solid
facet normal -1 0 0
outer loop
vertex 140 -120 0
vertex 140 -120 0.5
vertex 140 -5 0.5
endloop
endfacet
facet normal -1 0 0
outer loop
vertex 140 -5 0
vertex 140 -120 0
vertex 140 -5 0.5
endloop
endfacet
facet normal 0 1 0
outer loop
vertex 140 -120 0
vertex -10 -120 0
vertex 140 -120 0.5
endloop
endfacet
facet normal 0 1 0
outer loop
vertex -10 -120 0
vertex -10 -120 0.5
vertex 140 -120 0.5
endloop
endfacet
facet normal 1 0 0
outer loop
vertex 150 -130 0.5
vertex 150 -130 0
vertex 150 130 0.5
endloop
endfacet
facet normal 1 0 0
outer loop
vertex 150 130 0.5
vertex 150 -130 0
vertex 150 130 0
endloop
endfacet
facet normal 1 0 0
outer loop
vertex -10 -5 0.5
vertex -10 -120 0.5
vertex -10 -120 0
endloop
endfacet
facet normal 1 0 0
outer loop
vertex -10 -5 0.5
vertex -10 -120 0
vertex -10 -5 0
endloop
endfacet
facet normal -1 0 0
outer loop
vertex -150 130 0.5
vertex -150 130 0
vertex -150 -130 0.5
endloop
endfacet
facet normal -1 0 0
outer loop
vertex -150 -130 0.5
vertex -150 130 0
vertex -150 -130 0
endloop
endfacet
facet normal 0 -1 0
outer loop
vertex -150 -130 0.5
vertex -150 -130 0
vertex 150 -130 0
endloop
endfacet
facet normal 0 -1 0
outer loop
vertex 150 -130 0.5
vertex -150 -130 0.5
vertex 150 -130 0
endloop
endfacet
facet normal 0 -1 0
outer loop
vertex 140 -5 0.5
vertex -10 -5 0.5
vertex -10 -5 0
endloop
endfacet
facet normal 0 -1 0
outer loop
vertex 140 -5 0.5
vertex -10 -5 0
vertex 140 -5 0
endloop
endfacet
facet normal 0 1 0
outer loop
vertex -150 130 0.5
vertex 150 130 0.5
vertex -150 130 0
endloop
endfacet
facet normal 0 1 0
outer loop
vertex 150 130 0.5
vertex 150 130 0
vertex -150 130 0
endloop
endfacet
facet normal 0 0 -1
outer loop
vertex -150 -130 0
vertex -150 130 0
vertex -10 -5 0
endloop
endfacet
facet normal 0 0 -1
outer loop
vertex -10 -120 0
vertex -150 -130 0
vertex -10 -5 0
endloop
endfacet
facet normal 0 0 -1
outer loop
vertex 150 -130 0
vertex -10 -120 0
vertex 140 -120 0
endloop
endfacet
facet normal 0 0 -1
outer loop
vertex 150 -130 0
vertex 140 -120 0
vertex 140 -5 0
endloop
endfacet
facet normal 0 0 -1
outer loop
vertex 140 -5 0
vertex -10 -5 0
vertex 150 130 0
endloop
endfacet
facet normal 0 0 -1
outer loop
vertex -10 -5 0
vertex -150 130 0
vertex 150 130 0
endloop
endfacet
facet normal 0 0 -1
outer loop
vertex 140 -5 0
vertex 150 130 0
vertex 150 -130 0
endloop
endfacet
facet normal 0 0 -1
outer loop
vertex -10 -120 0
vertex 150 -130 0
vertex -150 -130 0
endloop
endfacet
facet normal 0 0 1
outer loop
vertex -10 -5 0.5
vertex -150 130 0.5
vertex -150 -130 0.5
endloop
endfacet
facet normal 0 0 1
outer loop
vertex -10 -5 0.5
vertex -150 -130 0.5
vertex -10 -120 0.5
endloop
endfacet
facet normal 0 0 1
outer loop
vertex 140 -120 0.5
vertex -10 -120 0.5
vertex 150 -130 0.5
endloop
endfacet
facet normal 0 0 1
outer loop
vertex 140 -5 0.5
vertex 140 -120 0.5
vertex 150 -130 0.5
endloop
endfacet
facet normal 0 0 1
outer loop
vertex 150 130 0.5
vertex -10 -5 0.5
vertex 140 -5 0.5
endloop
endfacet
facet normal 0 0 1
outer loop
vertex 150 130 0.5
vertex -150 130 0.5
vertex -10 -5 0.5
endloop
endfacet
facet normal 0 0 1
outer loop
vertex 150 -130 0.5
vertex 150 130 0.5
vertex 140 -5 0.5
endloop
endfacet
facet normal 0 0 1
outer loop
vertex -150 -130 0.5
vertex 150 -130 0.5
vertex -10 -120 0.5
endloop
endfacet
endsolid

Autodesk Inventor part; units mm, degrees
ref_plane "YZ Plane" through (0, 0, 0) normal (1, 0, 0) x (0, 1, 0)
ref_plane "XZ Plane" through (0, 0, 0) normal (0, 1, 0) x (-1, 0, 0)
ref_plane "XY Plane" through (0, 0, 0) normal (0, 0, 1) x (1, 0, 0)
sketch "Sketch1" plane through (0, 0, 0) normal (0, 0, 1) x (1, 0, 0)
  line L0 (-150, -130) -> (150, -130)
  line L1 (150, -130) -> (150, 130)
  line L2 (150, 130) -> (-150, 130)
  line L3 (-150, 130) -> (-150, -130)
  line L4 (-150, -130) -> (150, 130) construction
  line L5 (150, -130) -> (-150, 130) construction
  point P0 (0, 0)
  dimension "d0" = 300
  dimension "d1" = 260
extrude "Plate1" add sketch "Sketch1" along normal blind 0.5
sketch "Sketch3" plane through (0, 0, 0.5) normal (0, 0, 1) x (1, 0, 0)
  line L0 (-140, -120) -> (140, -120)
  line L1 (140, -120) -> (140, 120)
  line L2 (140, 120) -> (-140, 120)
  line L3 (-140, 120) -> (-140, -120)
  line L4 (-140, -120) -> (140, 120) construction
  line L5 (140, -120) -> (-140, 120) construction
  line L6 (140, -120) -> (-10, -120)
  line L7 (-10, -120) -> (-10, -5)
  line L8 (-10, -5) -> (140, -5)
  line L9 (140, -5) -> (140, -120)
  point P0 (0, 0)
  dimension "d3" = 280
  dimension "d4" = 240
  dimension "d5" = 150
  dimension "d6" = 115
extrude "Cut1" cut sketch "Sketch3" against normal blind 0.5 contours L7 L8 L1 L0
sketch "Sketch4" plane through (0, 0, 0.5) normal (0, 0, 1) x (1, 0, 0)
  line L0 (-150, 130) -> (150, 130) projected
  point P0 (0, 0)
  dimension "d9" = 300
equation "\"d7\" = Thickness"
equation "\"BendRadius\" = Thickness"
equation "\"BendReliefWidth\" = Thickness"
equation "\"BendReliefDepth\" = 0.5 * Thickness"
equation "\"CornerReliefSize\" = 4 * Thickness"
equation "\"MinimumRemnant\" = 2 * Thickness"
equation "\"TransitionRadius\" = BendRadius"
equation "\"JacobiRadiusSize\" = BendRadius"
equation "\"GapSize\" = Thickness"
equation "\"d2\" = BendRadius"
equation "\"Thickness\" = 0.5"
properties part number "rightPanel"
